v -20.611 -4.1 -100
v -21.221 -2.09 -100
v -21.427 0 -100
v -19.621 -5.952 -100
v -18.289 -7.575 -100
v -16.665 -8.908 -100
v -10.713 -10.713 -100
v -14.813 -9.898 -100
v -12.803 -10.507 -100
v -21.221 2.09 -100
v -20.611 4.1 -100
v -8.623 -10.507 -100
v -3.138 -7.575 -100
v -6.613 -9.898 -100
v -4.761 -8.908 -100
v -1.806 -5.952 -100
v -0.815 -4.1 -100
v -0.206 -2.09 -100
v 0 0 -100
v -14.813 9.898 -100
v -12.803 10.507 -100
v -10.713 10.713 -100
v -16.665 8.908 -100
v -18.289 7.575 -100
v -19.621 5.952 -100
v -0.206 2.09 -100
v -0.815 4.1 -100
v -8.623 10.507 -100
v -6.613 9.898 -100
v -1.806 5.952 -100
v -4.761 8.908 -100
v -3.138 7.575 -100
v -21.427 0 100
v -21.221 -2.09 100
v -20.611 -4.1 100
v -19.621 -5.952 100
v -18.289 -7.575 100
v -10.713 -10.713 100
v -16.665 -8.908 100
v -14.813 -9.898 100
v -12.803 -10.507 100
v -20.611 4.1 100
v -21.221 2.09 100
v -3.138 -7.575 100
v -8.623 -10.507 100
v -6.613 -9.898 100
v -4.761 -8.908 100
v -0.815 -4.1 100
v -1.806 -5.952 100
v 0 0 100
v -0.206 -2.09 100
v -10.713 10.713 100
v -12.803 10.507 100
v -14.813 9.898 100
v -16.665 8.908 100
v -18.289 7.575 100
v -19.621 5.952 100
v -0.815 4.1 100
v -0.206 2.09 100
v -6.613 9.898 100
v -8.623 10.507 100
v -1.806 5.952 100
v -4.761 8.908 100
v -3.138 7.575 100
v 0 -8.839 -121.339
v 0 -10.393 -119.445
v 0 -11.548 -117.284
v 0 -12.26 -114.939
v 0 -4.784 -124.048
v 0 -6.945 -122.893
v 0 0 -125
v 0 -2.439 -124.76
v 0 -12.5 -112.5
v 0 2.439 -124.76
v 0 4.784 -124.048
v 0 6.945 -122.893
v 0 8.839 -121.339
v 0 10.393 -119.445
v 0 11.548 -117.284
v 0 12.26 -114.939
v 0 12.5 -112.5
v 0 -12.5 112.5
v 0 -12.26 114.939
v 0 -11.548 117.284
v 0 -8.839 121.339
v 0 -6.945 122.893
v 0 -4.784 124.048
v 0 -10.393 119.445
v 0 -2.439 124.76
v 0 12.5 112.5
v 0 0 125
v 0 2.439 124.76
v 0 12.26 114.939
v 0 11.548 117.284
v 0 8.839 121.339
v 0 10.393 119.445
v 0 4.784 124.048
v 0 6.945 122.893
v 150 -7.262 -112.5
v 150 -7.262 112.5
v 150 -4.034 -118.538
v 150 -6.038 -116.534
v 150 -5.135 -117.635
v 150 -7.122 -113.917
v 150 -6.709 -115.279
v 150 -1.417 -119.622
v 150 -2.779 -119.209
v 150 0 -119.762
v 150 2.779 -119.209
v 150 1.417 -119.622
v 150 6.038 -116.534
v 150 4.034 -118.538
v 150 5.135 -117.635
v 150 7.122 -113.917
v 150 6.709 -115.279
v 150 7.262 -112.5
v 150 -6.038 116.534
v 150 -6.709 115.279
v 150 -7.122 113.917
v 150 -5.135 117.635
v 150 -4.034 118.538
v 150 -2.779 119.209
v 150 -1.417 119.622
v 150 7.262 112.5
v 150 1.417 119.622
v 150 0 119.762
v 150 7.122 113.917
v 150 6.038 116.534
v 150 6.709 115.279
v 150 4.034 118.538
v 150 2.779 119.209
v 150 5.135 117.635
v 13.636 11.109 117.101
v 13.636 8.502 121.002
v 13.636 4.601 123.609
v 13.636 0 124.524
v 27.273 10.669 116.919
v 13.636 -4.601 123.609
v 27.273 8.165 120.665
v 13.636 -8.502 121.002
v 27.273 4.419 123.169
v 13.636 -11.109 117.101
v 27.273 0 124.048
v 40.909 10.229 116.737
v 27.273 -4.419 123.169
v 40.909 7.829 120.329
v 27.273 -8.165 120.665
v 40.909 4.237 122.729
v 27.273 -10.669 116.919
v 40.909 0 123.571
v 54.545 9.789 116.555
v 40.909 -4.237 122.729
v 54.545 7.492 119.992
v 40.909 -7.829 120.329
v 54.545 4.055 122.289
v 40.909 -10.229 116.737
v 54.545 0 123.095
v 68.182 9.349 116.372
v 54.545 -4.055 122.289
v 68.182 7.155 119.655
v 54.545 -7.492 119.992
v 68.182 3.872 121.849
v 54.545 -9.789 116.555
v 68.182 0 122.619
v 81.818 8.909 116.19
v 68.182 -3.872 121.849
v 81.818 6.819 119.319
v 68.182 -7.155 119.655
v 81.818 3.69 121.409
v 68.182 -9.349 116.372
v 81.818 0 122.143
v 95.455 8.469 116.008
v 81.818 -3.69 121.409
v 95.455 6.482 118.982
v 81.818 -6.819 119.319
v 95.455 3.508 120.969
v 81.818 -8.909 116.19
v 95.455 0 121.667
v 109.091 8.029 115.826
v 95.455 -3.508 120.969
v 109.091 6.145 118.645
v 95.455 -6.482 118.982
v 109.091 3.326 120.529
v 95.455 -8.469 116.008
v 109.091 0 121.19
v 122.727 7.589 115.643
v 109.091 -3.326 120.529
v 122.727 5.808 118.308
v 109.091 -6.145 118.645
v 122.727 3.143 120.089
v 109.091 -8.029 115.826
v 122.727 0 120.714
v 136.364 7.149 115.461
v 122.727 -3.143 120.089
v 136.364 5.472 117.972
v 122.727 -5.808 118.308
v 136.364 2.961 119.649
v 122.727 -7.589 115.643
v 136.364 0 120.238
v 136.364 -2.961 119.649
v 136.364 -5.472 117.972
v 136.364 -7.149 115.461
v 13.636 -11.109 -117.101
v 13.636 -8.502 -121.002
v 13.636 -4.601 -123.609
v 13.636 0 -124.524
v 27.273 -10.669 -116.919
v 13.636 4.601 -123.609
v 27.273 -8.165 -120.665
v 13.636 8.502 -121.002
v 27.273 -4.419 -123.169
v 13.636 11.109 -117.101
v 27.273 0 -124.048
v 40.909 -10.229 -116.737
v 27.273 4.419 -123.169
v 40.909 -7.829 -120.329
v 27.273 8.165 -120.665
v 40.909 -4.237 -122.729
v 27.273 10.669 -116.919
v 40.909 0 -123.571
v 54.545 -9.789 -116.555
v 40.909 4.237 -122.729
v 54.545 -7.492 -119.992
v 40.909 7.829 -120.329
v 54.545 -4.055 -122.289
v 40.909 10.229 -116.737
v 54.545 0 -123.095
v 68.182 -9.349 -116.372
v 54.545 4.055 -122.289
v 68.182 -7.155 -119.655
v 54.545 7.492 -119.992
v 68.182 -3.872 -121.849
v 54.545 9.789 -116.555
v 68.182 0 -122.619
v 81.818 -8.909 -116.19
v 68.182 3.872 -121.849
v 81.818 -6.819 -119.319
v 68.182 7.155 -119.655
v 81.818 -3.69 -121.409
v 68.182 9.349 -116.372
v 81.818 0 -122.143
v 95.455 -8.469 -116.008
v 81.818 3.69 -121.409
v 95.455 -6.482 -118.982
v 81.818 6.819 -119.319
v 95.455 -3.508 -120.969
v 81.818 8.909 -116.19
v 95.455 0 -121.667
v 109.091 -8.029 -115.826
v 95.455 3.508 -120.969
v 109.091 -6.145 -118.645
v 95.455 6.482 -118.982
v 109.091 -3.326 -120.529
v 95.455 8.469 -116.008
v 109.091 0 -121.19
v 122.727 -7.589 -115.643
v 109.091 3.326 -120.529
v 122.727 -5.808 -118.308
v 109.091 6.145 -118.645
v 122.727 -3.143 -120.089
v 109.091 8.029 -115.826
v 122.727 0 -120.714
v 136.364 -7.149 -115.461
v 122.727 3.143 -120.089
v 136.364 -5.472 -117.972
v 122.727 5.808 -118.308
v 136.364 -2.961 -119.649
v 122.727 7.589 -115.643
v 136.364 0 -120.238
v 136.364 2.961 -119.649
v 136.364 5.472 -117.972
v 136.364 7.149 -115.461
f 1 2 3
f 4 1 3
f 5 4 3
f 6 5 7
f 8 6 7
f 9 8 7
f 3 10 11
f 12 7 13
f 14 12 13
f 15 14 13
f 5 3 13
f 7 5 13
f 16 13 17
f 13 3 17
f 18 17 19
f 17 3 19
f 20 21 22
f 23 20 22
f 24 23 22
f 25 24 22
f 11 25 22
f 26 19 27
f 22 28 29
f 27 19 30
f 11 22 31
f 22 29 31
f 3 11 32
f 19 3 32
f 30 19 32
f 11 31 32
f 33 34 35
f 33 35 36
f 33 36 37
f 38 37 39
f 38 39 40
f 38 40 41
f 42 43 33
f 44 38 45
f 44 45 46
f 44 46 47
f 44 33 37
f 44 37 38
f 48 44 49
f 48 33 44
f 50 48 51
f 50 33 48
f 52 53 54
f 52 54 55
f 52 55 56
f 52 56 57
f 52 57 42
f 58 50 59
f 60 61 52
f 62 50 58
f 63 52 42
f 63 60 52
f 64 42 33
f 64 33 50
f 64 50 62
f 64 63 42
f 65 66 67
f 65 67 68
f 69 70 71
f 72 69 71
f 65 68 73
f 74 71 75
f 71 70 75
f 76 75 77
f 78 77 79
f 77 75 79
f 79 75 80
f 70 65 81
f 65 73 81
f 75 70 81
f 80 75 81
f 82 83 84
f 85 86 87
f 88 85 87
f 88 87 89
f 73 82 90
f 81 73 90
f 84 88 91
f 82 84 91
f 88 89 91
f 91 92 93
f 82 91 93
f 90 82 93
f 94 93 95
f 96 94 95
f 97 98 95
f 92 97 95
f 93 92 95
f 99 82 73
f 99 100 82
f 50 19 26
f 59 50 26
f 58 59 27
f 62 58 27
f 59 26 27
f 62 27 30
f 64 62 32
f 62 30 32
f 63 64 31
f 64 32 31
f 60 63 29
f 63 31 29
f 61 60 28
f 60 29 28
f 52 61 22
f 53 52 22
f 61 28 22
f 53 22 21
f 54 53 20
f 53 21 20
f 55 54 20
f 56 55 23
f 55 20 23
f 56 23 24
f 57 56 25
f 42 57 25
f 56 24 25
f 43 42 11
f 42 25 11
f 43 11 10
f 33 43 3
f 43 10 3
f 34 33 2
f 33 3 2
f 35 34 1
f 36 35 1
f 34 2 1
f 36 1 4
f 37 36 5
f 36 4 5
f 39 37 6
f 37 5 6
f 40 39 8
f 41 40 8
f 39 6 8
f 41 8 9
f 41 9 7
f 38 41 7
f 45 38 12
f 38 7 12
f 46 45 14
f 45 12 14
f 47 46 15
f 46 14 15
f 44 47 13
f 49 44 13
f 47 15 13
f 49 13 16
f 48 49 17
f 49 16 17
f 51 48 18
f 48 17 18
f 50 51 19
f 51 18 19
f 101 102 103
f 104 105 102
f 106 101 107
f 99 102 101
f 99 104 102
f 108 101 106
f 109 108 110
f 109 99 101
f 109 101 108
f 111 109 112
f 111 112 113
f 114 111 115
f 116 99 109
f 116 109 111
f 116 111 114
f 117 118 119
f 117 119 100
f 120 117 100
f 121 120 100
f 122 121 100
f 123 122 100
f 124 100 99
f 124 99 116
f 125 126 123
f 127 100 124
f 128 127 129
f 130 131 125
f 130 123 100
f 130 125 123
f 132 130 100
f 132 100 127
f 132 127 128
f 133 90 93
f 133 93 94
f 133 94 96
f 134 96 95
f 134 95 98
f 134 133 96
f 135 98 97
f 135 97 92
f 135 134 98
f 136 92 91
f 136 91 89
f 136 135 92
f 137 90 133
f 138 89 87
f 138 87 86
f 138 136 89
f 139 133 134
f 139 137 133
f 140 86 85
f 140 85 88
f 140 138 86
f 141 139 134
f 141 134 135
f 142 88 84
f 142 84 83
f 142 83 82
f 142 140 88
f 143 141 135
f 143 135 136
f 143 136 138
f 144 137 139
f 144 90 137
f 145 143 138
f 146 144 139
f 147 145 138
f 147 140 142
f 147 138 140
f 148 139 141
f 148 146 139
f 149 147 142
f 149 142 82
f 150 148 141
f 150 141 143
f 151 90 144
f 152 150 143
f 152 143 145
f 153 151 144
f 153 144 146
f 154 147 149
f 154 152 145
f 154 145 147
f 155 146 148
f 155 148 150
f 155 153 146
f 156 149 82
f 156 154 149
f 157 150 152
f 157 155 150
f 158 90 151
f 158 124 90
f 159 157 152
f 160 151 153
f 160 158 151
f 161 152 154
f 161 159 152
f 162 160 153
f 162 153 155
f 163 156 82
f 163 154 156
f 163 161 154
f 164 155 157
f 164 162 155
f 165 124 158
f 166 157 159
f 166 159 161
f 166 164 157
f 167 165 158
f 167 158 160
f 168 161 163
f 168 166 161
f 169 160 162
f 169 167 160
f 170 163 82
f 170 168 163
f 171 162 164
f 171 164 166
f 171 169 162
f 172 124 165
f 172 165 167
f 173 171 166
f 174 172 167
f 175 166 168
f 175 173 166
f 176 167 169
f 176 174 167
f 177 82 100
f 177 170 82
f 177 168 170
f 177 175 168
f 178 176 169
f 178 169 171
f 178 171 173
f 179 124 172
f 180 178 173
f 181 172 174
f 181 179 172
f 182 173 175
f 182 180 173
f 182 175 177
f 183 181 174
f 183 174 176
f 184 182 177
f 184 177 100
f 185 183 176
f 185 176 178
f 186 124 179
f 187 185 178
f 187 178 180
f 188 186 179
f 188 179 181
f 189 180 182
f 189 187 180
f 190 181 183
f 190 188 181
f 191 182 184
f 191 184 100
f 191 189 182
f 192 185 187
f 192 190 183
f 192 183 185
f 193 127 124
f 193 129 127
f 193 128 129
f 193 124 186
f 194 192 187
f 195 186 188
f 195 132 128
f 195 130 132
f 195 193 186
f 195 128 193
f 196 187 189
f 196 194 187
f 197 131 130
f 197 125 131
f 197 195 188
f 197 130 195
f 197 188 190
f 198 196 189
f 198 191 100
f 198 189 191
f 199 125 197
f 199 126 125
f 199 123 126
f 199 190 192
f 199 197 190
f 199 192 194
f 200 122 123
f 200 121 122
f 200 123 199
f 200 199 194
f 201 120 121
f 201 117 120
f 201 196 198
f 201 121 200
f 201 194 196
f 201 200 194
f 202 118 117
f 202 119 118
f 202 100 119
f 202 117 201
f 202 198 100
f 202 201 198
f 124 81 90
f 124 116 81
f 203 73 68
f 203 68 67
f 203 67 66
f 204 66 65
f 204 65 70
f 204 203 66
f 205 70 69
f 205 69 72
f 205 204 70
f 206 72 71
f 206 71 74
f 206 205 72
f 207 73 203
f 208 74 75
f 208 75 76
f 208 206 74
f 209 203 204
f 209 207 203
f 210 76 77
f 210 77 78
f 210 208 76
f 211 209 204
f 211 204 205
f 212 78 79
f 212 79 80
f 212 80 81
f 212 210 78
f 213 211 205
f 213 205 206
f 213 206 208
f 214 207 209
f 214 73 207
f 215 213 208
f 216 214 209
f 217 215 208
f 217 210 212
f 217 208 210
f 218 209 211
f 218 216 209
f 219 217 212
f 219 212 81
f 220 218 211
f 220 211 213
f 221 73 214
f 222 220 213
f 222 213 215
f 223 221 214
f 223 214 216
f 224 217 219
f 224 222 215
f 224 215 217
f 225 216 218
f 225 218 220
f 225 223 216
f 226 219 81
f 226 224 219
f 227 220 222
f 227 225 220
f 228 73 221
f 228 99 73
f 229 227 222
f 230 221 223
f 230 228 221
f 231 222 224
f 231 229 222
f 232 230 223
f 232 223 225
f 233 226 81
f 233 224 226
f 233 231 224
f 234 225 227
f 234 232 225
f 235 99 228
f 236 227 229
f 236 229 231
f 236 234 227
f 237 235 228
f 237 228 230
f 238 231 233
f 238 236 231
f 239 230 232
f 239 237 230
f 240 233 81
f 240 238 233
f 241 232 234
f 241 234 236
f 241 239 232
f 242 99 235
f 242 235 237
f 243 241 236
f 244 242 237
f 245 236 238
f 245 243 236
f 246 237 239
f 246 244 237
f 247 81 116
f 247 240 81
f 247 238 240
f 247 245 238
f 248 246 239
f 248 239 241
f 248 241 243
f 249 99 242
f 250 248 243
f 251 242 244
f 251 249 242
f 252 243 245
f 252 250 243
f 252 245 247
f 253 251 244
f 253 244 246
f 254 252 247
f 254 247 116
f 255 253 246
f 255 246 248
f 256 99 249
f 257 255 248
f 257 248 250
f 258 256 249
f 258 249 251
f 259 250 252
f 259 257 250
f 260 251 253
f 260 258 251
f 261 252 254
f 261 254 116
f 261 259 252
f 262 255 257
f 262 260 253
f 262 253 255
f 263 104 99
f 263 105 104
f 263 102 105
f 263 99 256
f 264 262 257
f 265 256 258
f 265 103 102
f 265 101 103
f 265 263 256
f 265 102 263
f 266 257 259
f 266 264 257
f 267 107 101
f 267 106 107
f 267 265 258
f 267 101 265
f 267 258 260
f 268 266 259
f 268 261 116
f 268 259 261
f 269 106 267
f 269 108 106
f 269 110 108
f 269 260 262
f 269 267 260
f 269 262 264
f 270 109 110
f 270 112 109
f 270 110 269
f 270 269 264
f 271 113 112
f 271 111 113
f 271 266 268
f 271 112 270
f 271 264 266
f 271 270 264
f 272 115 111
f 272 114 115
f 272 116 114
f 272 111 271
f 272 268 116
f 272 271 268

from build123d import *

# Parameters (mm, degrees)
BOSS_EXTRUDE1_DEPTH      = 150
BOSS_EXTRUDE1_TAPER      = 2
BOSS_EXTRUDE3_DEPTH      = 100
BOSS_EXTRUDE3_DEPTH_BACK = 100
SKETCH3_R                = 10.713278849


with BuildPart() as part:
    # Sketch1 → Boss-Extrude1 (new body)
    with BuildSketch(Plane(origin=(0, 0, 0), x_dir=(0, 0, -1), z_dir=(1, 0, 0))):
        with BuildLine():
            ThreePointArc((-112.5, 12.5), (-125, 0), (-112.5, -12.5))
            Line((-112.5, -12.5), (112.5, -12.5))
            ThreePointArc((112.5, -12.5), (125, 0), (112.5, 12.5))
            Line((112.5, 12.5), (-112.5, 12.5))
        make_face()
    extrude(amount=BOSS_EXTRUDE1_DEPTH, taper=BOSS_EXTRUDE1_TAPER)


with BuildPart() as body_2:
    # Sketch3 → Boss-Extrude3 (new, two sides: drawn at the far end of the back side and taken through both)
    with BuildSketch(Plane.XY.offset(-BOSS_EXTRUDE3_DEPTH_BACK)):
        with Locations((-10.713278849, 0)):
            Circle(SKETCH3_R)
    extrude(amount=BOSS_EXTRUDE3_DEPTH + BOSS_EXTRUDE3_DEPTH_BACK)


solid = Compound([part.part, body_2.part])
